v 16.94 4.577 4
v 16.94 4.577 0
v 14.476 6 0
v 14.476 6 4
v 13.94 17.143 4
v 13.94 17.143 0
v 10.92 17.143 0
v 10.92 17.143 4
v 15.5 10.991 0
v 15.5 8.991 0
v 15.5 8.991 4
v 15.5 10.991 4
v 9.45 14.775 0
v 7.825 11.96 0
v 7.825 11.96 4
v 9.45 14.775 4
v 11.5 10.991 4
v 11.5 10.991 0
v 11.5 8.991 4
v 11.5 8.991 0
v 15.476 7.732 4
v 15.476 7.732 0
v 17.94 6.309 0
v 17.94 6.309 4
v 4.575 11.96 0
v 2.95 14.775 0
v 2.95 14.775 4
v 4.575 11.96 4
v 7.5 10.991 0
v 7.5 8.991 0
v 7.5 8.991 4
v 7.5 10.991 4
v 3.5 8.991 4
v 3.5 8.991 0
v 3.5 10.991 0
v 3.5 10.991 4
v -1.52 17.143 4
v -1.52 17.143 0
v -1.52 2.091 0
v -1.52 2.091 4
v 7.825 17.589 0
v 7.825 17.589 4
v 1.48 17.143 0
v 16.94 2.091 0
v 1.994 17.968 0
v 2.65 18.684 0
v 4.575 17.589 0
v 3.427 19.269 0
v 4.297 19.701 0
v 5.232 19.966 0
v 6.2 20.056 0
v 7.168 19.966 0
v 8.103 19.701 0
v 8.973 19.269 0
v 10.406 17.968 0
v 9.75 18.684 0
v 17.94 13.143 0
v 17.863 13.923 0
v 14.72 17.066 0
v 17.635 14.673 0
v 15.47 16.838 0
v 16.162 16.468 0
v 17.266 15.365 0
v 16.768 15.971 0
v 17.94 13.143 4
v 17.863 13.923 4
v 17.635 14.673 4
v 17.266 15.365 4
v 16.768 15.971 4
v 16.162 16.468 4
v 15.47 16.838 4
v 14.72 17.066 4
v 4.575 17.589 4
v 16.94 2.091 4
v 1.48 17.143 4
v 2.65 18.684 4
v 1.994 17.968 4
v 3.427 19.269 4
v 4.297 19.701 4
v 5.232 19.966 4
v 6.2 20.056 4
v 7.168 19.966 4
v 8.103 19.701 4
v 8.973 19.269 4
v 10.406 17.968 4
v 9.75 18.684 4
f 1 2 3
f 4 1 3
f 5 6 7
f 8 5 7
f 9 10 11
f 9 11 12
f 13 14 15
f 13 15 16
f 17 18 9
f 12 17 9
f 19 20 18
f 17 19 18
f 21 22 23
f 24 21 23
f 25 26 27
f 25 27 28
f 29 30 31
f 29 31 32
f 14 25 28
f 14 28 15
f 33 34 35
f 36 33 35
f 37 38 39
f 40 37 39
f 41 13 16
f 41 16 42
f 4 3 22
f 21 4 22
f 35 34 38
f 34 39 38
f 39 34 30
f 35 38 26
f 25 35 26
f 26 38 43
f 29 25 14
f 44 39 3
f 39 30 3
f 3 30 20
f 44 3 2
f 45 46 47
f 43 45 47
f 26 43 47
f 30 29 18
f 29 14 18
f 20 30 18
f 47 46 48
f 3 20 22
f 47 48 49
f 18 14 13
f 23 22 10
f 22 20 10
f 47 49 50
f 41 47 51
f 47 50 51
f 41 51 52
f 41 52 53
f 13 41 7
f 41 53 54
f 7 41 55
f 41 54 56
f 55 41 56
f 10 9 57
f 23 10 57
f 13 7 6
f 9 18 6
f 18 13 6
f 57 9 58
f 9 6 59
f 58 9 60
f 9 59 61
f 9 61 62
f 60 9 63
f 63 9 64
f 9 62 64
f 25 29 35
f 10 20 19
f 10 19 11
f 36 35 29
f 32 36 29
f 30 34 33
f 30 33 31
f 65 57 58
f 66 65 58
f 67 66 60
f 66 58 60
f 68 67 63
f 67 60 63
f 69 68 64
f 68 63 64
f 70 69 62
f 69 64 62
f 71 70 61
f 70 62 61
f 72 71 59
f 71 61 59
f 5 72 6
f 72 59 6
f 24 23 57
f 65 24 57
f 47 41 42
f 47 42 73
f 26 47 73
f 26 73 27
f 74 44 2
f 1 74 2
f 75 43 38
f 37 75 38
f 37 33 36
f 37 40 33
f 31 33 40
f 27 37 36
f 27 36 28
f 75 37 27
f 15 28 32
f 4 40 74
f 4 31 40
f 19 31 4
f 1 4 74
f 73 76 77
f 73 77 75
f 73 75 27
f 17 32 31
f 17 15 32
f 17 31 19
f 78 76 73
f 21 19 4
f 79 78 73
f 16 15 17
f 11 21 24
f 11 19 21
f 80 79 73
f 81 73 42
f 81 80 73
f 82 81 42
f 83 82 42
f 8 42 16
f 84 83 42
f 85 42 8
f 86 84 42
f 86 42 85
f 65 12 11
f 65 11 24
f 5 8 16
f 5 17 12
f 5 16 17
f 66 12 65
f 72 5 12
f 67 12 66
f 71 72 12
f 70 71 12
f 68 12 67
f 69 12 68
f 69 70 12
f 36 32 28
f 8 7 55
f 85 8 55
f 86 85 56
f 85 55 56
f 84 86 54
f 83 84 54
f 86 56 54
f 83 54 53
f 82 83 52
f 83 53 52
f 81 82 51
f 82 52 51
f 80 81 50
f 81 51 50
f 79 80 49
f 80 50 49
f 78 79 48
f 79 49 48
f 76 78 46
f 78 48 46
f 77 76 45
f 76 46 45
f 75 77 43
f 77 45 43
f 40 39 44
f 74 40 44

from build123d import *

# Parameters (mm, degrees)
SKETCH1_W           = 4
SKETCH1_H           = 2
BOSS_EXTRUDE1_DEPTH = 4


with BuildPart() as part:
    # Sketch1 → Boss-Extrude1 (new body)
    with BuildSketch(Plane.XY):
        with BuildLine():
            Line((14.475572066, 6), (15.475572066, 7.732050808))
            Line((15.475572066, 7.732050808), (17.939673681, 6.309401077))
            Line((17.939673681, 6.309401077), (17.939673681, 13.142551265))
            ThreePointArc((17.939673681, 13.142551265), (16.768100806, 15.97097839), (13.939673681, 17.142551265))
            Line((13.939673681, 17.142551265), (10.920326319, 17.142551265))
            ThreePointArc((10.920326319, 17.142551265), (6.2, 20.055557209), (1.479673681, 17.142551265))
            Line((1.479673681, 17.142551265), (-1.520326319, 17.142551265))
            Line((-1.520326319, 17.142551265), (-1.520326319, 2.09107808))
            Line((-1.520326319, 2.09107808), (16.939673681, 2.09107808))
            Line((16.939673681, 2.09107808), (16.939673681, 4.577350269))
            Line((16.939673681, 4.577350269), (14.475572066, 6))
        make_face()
        with Locations((5.5, 9.99107808)):
            Rectangle(SKETCH1_W, SKETCH1_H, mode=Mode.SUBTRACT)
        with Locations((13.5, 9.99107808)):
            Rectangle(SKETCH1_W, SKETCH1_H, mode=Mode.SUBTRACT)
        Polygon((2.95, 14.774571729), (4.575, 11.959989167), (7.825, 11.959989167), (9.45, 14.774571729), (7.825, 17.589154291), (4.575, 17.589154291), align=None, mode=Mode.SUBTRACT)
    extrude(amount=BOSS_EXTRUDE1_DEPTH)


solid = part.part
